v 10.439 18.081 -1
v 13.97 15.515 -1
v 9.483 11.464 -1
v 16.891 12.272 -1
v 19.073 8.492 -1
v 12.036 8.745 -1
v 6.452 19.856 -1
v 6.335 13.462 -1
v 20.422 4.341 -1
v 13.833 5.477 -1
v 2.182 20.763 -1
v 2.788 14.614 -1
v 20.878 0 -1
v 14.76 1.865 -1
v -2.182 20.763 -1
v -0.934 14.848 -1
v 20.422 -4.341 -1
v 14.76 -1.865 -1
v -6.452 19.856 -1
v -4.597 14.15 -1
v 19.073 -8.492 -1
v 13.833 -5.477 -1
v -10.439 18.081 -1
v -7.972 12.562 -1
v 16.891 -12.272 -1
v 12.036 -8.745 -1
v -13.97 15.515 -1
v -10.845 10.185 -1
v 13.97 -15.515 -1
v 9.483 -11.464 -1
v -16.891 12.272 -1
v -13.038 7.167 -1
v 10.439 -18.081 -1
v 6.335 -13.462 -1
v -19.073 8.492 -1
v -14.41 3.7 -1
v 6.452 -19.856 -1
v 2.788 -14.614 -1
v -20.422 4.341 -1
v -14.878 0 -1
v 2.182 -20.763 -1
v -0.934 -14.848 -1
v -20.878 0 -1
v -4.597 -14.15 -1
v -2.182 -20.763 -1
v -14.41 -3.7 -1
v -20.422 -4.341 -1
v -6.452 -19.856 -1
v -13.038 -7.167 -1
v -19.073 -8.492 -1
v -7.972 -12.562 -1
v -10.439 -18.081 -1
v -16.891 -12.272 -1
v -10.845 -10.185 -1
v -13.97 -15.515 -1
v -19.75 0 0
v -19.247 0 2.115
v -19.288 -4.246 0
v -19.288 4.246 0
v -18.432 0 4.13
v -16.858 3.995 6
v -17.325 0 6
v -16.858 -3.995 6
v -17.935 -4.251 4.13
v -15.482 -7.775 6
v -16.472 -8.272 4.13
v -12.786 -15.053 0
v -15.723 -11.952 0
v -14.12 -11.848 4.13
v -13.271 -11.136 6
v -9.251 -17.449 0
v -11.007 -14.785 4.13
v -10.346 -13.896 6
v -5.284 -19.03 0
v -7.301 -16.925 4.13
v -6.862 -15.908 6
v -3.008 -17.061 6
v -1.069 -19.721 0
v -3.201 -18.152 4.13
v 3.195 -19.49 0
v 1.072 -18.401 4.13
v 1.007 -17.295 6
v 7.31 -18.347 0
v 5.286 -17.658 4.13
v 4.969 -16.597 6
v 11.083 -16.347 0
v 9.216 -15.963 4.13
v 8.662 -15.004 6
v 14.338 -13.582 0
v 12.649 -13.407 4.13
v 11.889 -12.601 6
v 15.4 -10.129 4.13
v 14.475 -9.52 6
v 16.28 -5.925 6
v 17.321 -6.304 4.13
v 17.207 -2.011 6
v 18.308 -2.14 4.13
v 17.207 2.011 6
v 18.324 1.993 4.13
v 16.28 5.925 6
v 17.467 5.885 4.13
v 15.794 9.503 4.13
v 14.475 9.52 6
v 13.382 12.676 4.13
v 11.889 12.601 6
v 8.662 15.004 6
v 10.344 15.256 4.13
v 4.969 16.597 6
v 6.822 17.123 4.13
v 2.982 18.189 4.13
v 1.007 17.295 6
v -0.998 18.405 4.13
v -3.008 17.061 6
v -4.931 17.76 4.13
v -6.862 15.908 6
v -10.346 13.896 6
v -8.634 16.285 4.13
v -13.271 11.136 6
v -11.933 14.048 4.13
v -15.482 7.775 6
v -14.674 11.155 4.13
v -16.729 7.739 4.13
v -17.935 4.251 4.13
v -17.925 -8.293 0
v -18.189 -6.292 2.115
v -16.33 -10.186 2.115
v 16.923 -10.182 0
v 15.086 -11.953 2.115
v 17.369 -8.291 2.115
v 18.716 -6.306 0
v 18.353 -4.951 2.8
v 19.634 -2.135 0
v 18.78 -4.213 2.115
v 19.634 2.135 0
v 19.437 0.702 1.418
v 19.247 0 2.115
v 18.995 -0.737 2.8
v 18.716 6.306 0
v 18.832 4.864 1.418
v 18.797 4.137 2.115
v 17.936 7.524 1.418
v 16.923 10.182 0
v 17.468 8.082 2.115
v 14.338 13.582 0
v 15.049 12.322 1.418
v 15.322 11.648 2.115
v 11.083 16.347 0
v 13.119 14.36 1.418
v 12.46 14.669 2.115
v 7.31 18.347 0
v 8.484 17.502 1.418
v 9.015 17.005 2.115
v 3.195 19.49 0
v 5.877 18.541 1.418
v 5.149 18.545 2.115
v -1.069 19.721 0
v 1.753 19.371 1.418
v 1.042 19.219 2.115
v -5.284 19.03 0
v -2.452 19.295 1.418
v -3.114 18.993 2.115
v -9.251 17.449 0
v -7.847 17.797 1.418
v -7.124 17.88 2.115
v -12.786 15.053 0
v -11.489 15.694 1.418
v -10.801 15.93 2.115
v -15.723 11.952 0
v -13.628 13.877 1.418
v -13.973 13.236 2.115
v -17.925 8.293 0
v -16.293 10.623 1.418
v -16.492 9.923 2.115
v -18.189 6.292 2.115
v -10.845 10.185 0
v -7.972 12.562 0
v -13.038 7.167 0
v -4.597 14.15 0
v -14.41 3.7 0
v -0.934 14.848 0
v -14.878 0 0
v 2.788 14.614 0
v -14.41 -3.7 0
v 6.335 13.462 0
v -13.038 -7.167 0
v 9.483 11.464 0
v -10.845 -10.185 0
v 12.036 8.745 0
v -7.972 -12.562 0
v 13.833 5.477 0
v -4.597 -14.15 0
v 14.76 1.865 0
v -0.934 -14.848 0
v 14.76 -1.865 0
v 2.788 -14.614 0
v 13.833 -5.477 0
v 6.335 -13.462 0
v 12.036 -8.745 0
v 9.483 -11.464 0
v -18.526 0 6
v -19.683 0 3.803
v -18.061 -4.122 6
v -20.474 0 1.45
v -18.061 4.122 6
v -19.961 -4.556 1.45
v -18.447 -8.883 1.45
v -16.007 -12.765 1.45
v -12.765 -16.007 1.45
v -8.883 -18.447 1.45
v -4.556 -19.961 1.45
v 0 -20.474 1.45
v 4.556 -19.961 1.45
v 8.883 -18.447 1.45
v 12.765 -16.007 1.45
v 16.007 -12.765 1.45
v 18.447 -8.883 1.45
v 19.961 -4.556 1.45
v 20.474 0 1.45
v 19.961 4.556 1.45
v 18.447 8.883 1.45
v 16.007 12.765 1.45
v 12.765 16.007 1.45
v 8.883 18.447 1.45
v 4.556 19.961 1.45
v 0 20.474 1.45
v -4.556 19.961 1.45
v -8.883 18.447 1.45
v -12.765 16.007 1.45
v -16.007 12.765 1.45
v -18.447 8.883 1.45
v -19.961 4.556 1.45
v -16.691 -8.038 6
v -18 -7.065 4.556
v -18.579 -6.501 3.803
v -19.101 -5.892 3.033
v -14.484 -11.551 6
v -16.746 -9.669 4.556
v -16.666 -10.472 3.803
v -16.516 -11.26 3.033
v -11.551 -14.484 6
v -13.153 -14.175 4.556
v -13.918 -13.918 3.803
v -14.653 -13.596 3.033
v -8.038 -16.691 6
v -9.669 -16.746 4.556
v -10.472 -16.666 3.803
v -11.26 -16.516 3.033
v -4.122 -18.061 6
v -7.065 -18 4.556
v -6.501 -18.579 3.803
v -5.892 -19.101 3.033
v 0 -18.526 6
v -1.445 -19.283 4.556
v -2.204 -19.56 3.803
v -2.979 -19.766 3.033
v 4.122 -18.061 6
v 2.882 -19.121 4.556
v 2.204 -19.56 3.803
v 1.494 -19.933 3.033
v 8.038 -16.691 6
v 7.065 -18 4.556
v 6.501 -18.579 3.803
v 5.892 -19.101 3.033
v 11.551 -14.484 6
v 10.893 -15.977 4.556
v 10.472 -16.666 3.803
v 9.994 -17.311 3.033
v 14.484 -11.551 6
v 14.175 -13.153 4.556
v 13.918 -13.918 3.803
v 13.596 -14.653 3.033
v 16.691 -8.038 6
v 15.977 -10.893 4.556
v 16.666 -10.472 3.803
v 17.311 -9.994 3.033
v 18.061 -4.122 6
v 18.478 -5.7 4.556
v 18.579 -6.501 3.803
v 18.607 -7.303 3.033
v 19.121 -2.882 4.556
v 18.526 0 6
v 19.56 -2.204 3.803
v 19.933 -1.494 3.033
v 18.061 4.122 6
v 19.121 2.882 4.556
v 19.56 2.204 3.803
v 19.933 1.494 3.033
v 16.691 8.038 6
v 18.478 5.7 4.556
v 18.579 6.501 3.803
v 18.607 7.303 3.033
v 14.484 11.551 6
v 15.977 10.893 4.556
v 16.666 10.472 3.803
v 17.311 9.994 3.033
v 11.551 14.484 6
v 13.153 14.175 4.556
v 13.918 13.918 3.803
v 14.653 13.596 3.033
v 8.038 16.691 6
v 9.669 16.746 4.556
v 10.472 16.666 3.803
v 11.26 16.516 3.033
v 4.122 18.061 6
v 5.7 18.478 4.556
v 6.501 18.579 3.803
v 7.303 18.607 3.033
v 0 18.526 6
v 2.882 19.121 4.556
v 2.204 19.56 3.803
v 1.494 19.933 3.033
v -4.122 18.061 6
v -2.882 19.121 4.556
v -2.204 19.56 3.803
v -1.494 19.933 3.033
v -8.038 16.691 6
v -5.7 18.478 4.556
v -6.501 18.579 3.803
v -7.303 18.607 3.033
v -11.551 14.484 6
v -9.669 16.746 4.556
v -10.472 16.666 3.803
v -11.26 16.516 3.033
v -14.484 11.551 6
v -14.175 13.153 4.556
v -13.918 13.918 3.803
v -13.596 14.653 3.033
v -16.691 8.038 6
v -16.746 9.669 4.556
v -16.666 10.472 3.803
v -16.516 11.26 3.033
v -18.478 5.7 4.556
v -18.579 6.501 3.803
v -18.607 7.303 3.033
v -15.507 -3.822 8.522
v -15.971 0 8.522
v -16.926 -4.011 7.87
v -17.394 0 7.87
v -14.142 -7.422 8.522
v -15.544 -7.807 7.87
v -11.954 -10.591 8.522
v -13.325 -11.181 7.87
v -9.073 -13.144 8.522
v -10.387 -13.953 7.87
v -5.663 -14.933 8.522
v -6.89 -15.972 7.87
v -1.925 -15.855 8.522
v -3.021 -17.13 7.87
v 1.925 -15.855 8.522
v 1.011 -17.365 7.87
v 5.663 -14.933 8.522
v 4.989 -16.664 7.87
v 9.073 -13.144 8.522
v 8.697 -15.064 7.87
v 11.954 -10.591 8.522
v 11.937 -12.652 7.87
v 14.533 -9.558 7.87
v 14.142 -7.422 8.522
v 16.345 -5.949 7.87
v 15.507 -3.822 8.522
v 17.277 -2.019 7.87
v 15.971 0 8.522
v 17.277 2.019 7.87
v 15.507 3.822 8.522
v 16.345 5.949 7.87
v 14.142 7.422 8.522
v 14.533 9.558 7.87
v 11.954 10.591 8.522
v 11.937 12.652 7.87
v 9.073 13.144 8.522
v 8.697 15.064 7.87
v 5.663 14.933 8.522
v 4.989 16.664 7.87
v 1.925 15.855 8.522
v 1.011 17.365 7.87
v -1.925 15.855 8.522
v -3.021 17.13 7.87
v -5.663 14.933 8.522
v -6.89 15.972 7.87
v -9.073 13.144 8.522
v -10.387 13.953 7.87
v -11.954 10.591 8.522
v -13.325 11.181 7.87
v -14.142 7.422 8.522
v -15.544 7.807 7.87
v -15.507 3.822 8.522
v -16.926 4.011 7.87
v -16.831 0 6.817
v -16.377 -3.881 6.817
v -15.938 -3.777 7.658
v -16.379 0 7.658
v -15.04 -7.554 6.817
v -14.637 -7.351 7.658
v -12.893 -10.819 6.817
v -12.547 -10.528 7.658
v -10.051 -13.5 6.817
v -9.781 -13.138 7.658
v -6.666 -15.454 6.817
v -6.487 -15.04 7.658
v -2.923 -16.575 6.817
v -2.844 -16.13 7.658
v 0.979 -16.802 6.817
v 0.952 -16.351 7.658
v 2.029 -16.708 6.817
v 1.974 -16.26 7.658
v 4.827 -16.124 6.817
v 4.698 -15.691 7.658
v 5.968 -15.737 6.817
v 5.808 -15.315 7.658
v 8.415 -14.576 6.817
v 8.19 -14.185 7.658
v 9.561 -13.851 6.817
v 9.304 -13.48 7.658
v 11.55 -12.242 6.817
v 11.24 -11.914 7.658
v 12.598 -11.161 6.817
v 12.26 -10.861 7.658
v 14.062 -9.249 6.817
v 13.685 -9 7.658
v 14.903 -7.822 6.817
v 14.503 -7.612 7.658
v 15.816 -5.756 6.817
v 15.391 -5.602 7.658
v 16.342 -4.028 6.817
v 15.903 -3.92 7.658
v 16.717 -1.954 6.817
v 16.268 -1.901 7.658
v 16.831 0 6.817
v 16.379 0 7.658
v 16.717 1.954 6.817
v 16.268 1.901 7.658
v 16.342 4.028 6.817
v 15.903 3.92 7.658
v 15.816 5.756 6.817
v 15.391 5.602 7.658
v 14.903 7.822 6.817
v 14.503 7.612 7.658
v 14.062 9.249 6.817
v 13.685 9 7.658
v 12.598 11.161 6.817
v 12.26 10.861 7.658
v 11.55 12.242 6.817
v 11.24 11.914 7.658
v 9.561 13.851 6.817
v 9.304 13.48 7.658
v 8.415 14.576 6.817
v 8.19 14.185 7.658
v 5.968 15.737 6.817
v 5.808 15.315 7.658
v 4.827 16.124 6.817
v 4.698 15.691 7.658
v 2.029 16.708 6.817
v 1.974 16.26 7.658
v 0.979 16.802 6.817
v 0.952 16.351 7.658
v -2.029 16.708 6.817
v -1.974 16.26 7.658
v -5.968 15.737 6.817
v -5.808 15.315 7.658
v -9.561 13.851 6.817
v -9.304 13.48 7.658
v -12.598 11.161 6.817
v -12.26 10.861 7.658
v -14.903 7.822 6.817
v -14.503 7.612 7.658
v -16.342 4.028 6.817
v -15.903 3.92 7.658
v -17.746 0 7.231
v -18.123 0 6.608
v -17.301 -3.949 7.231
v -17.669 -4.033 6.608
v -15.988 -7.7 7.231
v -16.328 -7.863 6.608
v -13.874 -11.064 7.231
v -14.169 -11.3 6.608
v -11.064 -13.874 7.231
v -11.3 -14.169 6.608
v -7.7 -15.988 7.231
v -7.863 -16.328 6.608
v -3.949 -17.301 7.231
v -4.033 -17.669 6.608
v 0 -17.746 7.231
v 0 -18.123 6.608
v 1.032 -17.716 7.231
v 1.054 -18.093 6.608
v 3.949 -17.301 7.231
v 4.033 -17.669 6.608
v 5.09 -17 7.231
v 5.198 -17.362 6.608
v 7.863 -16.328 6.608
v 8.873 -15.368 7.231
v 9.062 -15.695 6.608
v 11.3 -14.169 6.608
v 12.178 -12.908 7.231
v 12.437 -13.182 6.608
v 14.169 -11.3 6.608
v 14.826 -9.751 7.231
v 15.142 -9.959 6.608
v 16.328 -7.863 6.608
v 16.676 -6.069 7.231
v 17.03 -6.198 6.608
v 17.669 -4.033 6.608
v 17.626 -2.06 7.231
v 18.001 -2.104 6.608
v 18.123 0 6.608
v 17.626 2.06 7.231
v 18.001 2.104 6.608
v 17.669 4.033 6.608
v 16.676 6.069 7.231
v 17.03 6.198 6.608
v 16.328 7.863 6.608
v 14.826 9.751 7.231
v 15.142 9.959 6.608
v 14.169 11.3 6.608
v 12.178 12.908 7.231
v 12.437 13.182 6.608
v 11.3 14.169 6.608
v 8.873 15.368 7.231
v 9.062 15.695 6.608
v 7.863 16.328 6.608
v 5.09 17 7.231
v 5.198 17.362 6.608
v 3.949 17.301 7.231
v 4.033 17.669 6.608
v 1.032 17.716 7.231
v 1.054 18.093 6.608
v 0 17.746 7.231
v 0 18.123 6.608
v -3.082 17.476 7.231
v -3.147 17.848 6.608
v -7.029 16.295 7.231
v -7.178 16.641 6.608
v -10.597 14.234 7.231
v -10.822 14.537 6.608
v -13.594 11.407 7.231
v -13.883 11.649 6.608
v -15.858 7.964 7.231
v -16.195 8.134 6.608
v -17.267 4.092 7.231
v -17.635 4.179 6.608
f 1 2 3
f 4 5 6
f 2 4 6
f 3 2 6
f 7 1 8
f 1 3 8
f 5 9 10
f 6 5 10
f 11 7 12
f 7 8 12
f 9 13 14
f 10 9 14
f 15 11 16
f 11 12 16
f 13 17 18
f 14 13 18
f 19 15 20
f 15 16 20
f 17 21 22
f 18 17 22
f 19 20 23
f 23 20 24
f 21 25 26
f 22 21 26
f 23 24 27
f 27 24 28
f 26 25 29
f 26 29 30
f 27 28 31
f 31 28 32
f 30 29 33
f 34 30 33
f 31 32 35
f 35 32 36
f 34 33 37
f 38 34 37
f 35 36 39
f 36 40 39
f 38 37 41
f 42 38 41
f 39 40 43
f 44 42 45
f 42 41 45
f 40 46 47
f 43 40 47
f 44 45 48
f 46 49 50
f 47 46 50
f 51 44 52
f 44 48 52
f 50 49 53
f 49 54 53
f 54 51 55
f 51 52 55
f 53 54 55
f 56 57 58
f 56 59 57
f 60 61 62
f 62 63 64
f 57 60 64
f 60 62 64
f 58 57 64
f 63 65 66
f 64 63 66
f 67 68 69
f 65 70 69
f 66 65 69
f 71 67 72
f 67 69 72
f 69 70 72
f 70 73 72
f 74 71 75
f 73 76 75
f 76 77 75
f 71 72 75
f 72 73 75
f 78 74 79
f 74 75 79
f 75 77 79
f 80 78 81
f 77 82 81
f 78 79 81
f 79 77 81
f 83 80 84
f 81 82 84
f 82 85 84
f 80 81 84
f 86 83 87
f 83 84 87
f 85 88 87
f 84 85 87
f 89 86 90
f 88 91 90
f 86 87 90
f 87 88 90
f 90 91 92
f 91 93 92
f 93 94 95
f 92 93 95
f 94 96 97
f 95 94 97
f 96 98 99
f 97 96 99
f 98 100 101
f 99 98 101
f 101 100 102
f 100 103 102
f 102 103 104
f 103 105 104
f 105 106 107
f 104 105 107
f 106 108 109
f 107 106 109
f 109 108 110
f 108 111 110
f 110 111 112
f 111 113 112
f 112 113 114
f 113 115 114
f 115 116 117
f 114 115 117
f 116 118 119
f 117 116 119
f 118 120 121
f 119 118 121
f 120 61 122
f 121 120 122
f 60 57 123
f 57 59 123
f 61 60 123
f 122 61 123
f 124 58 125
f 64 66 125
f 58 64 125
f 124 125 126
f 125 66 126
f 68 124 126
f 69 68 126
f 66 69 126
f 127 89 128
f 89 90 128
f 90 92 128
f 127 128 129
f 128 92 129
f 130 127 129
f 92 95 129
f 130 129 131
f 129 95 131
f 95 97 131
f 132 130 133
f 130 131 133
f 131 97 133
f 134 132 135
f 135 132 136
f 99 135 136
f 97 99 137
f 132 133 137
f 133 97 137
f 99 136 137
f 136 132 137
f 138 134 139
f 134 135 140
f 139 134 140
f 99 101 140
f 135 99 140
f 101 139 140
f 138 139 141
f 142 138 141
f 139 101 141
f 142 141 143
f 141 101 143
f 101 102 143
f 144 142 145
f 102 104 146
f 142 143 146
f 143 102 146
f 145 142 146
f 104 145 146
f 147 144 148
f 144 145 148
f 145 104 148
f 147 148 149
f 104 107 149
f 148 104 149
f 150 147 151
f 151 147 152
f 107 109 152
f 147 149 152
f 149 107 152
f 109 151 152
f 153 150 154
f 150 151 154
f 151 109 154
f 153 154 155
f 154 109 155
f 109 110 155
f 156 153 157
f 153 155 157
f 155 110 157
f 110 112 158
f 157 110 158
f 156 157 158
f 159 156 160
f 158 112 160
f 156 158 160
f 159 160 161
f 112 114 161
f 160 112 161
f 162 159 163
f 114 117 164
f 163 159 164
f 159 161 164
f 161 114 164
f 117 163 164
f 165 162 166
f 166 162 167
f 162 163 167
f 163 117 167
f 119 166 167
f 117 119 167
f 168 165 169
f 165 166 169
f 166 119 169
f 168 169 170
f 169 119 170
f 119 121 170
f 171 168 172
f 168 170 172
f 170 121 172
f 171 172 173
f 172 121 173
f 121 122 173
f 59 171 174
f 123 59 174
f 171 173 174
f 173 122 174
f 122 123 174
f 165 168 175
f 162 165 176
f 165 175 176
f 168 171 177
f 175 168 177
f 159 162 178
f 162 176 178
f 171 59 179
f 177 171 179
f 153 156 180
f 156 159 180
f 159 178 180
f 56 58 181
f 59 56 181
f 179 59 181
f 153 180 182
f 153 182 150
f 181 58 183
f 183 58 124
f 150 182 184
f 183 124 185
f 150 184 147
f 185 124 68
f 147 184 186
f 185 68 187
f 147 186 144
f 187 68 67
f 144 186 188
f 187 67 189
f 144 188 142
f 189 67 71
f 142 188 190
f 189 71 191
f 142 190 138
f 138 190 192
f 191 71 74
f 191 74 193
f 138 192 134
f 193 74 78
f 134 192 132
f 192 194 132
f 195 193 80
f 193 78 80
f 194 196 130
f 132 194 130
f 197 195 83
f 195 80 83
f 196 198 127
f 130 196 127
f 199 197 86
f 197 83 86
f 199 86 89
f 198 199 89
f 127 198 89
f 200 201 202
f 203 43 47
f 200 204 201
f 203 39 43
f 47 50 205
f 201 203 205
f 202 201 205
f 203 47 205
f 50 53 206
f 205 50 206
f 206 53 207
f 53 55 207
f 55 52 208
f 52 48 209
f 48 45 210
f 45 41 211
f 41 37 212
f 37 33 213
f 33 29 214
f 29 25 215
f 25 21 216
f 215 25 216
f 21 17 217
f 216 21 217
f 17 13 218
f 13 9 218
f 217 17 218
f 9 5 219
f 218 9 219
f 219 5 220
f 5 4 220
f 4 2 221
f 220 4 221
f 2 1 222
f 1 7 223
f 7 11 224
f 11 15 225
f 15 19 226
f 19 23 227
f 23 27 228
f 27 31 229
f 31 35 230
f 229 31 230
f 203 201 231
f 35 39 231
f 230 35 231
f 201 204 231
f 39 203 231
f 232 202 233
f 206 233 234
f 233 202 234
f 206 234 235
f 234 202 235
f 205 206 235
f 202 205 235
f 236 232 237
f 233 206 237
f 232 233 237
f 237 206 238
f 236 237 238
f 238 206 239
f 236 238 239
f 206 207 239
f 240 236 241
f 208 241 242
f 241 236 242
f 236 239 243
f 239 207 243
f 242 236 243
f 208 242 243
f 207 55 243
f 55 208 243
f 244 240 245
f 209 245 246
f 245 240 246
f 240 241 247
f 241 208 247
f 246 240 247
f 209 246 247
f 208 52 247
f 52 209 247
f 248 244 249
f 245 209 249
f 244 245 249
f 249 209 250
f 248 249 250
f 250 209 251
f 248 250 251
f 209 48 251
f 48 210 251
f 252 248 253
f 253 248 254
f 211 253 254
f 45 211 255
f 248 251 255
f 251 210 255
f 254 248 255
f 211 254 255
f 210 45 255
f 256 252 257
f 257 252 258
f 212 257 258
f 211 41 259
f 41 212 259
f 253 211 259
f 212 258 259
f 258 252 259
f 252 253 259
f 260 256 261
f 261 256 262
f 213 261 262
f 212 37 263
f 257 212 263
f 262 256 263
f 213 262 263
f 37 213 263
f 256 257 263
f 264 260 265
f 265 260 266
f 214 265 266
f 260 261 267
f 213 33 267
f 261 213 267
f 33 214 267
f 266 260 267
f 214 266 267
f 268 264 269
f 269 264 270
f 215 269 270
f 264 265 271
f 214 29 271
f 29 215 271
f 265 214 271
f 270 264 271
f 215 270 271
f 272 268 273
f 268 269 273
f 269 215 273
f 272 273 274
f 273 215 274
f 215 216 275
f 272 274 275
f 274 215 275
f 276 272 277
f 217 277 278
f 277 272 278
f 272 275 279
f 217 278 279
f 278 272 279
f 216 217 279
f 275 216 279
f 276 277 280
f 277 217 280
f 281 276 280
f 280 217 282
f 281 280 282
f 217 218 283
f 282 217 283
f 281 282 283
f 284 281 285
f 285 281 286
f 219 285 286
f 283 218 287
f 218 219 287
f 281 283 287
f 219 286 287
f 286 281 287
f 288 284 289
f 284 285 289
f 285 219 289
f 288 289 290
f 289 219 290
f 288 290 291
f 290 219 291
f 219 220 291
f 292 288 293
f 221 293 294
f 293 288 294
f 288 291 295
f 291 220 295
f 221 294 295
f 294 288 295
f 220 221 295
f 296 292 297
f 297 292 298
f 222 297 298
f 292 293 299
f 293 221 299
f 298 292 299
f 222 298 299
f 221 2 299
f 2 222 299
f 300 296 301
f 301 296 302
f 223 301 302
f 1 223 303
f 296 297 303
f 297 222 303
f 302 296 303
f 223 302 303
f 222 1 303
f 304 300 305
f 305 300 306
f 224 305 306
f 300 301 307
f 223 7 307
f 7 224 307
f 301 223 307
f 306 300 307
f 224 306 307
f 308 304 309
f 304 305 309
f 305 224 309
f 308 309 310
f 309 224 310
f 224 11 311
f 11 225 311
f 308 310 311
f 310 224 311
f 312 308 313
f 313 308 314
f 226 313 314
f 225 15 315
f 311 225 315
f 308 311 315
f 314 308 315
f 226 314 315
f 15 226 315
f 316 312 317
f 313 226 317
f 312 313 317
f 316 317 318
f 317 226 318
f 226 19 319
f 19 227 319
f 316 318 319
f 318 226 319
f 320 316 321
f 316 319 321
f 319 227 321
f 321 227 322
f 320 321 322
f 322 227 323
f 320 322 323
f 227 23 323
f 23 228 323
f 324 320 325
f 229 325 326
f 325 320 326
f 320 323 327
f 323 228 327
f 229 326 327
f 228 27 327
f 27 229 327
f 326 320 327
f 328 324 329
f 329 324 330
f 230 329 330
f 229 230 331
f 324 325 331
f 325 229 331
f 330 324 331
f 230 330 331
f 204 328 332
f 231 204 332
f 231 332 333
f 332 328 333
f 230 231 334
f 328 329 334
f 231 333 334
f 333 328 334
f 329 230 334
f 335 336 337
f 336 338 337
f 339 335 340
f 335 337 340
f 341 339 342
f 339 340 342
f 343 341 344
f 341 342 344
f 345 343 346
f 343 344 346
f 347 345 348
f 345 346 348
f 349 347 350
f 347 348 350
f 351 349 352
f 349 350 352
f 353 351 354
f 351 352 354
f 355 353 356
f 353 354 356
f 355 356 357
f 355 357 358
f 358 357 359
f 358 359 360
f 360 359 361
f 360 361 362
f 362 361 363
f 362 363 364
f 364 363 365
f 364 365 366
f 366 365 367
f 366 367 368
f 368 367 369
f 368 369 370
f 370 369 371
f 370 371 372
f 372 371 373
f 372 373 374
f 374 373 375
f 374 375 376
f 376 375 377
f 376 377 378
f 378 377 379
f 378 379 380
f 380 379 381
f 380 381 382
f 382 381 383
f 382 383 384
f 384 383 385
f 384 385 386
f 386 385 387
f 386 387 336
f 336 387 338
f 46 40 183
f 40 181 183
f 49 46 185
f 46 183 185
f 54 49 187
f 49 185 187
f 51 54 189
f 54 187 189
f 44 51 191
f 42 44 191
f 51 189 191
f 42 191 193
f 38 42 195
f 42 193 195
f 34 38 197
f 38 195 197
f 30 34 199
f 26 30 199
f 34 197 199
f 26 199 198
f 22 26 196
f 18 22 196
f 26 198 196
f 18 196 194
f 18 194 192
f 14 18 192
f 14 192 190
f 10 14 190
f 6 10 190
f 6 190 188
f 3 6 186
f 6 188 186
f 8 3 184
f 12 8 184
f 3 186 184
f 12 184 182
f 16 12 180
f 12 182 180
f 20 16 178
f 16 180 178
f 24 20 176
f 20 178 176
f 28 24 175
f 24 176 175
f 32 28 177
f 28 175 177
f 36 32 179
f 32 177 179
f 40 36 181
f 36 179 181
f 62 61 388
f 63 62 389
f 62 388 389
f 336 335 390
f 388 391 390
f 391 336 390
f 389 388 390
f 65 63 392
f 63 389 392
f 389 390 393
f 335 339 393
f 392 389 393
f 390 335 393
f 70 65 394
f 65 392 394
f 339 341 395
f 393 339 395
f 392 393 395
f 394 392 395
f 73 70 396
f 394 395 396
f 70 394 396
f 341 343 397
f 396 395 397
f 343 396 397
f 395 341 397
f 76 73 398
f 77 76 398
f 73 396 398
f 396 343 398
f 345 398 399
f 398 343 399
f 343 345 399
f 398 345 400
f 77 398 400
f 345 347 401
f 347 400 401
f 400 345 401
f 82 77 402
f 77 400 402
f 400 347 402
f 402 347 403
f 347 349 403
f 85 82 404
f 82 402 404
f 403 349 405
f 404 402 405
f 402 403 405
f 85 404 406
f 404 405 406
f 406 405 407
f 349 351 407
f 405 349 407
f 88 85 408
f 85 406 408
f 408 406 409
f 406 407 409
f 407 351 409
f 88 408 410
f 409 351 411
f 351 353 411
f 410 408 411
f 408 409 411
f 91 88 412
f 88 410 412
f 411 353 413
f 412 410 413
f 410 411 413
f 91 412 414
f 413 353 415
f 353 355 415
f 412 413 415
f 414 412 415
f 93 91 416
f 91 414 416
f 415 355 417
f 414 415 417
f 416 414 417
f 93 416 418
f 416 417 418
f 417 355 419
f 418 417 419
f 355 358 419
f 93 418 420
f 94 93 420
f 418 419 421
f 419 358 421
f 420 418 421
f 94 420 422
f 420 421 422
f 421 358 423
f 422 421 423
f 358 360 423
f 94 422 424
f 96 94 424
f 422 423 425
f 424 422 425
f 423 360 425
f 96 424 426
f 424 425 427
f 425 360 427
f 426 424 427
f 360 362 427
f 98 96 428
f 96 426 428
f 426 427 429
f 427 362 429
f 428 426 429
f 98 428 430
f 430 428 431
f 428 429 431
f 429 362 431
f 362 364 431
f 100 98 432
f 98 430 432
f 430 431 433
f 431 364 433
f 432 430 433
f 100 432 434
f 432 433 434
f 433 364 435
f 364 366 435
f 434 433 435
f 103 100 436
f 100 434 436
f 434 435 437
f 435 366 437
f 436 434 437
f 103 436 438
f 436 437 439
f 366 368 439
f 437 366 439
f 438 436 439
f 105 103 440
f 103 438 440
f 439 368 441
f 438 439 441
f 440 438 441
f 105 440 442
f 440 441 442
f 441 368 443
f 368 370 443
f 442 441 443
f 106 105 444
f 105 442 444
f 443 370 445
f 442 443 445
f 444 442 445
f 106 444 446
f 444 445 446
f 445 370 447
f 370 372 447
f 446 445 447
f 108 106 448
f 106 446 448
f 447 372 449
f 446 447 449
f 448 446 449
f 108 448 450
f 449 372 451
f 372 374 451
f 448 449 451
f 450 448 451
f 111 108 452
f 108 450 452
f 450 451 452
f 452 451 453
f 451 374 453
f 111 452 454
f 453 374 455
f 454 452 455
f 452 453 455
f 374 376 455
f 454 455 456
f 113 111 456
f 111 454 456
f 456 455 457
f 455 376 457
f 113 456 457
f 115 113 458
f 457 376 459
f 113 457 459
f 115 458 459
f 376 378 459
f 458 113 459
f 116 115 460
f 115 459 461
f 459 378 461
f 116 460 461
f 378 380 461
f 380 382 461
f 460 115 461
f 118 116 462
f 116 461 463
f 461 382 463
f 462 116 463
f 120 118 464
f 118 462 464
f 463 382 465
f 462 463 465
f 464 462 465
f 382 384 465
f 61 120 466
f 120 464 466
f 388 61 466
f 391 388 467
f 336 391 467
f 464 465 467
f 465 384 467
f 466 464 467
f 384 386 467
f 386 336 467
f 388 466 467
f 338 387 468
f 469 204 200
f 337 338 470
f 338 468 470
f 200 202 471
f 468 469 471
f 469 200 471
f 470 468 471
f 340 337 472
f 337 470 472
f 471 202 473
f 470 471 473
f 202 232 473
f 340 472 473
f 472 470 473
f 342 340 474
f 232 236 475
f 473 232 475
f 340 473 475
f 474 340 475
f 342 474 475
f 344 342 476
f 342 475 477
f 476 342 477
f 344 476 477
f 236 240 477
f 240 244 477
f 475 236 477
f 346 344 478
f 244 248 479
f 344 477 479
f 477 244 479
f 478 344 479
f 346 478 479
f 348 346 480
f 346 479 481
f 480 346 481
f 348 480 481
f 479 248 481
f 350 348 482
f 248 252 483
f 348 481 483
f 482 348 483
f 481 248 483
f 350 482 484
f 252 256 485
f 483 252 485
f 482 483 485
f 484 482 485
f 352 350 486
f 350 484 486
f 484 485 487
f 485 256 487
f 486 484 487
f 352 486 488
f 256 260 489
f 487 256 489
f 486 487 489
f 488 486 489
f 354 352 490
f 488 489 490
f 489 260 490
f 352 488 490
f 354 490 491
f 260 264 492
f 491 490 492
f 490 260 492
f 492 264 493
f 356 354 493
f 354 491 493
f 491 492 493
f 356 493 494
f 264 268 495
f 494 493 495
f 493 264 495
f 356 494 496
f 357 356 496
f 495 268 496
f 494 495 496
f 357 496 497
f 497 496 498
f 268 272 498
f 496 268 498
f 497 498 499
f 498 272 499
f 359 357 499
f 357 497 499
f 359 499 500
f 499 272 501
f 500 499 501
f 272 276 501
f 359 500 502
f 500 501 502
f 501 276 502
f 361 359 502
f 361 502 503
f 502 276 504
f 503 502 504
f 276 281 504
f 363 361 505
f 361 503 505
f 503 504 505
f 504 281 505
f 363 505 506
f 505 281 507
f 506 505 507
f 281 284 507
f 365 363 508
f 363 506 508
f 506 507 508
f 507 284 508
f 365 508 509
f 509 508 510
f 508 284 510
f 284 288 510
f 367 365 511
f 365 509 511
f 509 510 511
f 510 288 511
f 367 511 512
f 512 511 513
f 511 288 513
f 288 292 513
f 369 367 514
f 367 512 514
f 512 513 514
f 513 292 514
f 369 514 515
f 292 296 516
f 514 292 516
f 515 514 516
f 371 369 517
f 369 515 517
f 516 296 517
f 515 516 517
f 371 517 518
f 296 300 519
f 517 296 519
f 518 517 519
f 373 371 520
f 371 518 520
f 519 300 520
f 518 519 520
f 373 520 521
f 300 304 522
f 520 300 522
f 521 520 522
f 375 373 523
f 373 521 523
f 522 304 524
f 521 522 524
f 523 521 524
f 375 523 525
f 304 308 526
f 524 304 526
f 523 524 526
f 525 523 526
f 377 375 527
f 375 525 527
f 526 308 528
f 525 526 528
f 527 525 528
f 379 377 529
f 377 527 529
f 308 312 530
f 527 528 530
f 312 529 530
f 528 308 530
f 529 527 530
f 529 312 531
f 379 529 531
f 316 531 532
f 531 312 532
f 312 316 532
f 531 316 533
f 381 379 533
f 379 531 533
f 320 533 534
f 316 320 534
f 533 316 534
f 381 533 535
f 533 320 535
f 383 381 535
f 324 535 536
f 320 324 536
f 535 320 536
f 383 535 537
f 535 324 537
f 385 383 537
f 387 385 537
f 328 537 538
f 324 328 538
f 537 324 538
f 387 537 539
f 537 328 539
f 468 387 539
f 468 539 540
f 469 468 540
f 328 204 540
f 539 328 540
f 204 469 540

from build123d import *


with BuildPart() as f2:
    # F1 (on Front) → F2 (revolve)
    with BuildSketch(Plane.XZ):
        with BuildLine():
            ThreePointArc((-19.75, 0), (-18.8774355083, 3.1374853065), (-17.3246340174, 6))
            ThreePointArc((-17.3246340174, 6), (-16.5995192538, 7.2348568467), (-15.9709975123, 8.5215670988))
            Line((-15.9709975123, 8.5215670988), (-17.3944850113, 7.8702563207))
            ThreePointArc((-17.3944850113, 7.8702563207), (-17.9313073667, 6.9176508907), (-18.5259099141, 6))
            ThreePointArc((-18.5259099141, 6), (-20.1261112743, 2.6425417796), (-20.8778156574, -1))
            Line((-20.8778156574, -1), (-14.8778156574, -1))
            Line((-14.8778156574, -1), (-14.8778156574, 0))
            Line((-14.8778156574, 0), (-19.75, 0))
        make_face()
    revolve(axis=Axis((0, 0, 0), (0, 0, 1)))


solid = f2.part
